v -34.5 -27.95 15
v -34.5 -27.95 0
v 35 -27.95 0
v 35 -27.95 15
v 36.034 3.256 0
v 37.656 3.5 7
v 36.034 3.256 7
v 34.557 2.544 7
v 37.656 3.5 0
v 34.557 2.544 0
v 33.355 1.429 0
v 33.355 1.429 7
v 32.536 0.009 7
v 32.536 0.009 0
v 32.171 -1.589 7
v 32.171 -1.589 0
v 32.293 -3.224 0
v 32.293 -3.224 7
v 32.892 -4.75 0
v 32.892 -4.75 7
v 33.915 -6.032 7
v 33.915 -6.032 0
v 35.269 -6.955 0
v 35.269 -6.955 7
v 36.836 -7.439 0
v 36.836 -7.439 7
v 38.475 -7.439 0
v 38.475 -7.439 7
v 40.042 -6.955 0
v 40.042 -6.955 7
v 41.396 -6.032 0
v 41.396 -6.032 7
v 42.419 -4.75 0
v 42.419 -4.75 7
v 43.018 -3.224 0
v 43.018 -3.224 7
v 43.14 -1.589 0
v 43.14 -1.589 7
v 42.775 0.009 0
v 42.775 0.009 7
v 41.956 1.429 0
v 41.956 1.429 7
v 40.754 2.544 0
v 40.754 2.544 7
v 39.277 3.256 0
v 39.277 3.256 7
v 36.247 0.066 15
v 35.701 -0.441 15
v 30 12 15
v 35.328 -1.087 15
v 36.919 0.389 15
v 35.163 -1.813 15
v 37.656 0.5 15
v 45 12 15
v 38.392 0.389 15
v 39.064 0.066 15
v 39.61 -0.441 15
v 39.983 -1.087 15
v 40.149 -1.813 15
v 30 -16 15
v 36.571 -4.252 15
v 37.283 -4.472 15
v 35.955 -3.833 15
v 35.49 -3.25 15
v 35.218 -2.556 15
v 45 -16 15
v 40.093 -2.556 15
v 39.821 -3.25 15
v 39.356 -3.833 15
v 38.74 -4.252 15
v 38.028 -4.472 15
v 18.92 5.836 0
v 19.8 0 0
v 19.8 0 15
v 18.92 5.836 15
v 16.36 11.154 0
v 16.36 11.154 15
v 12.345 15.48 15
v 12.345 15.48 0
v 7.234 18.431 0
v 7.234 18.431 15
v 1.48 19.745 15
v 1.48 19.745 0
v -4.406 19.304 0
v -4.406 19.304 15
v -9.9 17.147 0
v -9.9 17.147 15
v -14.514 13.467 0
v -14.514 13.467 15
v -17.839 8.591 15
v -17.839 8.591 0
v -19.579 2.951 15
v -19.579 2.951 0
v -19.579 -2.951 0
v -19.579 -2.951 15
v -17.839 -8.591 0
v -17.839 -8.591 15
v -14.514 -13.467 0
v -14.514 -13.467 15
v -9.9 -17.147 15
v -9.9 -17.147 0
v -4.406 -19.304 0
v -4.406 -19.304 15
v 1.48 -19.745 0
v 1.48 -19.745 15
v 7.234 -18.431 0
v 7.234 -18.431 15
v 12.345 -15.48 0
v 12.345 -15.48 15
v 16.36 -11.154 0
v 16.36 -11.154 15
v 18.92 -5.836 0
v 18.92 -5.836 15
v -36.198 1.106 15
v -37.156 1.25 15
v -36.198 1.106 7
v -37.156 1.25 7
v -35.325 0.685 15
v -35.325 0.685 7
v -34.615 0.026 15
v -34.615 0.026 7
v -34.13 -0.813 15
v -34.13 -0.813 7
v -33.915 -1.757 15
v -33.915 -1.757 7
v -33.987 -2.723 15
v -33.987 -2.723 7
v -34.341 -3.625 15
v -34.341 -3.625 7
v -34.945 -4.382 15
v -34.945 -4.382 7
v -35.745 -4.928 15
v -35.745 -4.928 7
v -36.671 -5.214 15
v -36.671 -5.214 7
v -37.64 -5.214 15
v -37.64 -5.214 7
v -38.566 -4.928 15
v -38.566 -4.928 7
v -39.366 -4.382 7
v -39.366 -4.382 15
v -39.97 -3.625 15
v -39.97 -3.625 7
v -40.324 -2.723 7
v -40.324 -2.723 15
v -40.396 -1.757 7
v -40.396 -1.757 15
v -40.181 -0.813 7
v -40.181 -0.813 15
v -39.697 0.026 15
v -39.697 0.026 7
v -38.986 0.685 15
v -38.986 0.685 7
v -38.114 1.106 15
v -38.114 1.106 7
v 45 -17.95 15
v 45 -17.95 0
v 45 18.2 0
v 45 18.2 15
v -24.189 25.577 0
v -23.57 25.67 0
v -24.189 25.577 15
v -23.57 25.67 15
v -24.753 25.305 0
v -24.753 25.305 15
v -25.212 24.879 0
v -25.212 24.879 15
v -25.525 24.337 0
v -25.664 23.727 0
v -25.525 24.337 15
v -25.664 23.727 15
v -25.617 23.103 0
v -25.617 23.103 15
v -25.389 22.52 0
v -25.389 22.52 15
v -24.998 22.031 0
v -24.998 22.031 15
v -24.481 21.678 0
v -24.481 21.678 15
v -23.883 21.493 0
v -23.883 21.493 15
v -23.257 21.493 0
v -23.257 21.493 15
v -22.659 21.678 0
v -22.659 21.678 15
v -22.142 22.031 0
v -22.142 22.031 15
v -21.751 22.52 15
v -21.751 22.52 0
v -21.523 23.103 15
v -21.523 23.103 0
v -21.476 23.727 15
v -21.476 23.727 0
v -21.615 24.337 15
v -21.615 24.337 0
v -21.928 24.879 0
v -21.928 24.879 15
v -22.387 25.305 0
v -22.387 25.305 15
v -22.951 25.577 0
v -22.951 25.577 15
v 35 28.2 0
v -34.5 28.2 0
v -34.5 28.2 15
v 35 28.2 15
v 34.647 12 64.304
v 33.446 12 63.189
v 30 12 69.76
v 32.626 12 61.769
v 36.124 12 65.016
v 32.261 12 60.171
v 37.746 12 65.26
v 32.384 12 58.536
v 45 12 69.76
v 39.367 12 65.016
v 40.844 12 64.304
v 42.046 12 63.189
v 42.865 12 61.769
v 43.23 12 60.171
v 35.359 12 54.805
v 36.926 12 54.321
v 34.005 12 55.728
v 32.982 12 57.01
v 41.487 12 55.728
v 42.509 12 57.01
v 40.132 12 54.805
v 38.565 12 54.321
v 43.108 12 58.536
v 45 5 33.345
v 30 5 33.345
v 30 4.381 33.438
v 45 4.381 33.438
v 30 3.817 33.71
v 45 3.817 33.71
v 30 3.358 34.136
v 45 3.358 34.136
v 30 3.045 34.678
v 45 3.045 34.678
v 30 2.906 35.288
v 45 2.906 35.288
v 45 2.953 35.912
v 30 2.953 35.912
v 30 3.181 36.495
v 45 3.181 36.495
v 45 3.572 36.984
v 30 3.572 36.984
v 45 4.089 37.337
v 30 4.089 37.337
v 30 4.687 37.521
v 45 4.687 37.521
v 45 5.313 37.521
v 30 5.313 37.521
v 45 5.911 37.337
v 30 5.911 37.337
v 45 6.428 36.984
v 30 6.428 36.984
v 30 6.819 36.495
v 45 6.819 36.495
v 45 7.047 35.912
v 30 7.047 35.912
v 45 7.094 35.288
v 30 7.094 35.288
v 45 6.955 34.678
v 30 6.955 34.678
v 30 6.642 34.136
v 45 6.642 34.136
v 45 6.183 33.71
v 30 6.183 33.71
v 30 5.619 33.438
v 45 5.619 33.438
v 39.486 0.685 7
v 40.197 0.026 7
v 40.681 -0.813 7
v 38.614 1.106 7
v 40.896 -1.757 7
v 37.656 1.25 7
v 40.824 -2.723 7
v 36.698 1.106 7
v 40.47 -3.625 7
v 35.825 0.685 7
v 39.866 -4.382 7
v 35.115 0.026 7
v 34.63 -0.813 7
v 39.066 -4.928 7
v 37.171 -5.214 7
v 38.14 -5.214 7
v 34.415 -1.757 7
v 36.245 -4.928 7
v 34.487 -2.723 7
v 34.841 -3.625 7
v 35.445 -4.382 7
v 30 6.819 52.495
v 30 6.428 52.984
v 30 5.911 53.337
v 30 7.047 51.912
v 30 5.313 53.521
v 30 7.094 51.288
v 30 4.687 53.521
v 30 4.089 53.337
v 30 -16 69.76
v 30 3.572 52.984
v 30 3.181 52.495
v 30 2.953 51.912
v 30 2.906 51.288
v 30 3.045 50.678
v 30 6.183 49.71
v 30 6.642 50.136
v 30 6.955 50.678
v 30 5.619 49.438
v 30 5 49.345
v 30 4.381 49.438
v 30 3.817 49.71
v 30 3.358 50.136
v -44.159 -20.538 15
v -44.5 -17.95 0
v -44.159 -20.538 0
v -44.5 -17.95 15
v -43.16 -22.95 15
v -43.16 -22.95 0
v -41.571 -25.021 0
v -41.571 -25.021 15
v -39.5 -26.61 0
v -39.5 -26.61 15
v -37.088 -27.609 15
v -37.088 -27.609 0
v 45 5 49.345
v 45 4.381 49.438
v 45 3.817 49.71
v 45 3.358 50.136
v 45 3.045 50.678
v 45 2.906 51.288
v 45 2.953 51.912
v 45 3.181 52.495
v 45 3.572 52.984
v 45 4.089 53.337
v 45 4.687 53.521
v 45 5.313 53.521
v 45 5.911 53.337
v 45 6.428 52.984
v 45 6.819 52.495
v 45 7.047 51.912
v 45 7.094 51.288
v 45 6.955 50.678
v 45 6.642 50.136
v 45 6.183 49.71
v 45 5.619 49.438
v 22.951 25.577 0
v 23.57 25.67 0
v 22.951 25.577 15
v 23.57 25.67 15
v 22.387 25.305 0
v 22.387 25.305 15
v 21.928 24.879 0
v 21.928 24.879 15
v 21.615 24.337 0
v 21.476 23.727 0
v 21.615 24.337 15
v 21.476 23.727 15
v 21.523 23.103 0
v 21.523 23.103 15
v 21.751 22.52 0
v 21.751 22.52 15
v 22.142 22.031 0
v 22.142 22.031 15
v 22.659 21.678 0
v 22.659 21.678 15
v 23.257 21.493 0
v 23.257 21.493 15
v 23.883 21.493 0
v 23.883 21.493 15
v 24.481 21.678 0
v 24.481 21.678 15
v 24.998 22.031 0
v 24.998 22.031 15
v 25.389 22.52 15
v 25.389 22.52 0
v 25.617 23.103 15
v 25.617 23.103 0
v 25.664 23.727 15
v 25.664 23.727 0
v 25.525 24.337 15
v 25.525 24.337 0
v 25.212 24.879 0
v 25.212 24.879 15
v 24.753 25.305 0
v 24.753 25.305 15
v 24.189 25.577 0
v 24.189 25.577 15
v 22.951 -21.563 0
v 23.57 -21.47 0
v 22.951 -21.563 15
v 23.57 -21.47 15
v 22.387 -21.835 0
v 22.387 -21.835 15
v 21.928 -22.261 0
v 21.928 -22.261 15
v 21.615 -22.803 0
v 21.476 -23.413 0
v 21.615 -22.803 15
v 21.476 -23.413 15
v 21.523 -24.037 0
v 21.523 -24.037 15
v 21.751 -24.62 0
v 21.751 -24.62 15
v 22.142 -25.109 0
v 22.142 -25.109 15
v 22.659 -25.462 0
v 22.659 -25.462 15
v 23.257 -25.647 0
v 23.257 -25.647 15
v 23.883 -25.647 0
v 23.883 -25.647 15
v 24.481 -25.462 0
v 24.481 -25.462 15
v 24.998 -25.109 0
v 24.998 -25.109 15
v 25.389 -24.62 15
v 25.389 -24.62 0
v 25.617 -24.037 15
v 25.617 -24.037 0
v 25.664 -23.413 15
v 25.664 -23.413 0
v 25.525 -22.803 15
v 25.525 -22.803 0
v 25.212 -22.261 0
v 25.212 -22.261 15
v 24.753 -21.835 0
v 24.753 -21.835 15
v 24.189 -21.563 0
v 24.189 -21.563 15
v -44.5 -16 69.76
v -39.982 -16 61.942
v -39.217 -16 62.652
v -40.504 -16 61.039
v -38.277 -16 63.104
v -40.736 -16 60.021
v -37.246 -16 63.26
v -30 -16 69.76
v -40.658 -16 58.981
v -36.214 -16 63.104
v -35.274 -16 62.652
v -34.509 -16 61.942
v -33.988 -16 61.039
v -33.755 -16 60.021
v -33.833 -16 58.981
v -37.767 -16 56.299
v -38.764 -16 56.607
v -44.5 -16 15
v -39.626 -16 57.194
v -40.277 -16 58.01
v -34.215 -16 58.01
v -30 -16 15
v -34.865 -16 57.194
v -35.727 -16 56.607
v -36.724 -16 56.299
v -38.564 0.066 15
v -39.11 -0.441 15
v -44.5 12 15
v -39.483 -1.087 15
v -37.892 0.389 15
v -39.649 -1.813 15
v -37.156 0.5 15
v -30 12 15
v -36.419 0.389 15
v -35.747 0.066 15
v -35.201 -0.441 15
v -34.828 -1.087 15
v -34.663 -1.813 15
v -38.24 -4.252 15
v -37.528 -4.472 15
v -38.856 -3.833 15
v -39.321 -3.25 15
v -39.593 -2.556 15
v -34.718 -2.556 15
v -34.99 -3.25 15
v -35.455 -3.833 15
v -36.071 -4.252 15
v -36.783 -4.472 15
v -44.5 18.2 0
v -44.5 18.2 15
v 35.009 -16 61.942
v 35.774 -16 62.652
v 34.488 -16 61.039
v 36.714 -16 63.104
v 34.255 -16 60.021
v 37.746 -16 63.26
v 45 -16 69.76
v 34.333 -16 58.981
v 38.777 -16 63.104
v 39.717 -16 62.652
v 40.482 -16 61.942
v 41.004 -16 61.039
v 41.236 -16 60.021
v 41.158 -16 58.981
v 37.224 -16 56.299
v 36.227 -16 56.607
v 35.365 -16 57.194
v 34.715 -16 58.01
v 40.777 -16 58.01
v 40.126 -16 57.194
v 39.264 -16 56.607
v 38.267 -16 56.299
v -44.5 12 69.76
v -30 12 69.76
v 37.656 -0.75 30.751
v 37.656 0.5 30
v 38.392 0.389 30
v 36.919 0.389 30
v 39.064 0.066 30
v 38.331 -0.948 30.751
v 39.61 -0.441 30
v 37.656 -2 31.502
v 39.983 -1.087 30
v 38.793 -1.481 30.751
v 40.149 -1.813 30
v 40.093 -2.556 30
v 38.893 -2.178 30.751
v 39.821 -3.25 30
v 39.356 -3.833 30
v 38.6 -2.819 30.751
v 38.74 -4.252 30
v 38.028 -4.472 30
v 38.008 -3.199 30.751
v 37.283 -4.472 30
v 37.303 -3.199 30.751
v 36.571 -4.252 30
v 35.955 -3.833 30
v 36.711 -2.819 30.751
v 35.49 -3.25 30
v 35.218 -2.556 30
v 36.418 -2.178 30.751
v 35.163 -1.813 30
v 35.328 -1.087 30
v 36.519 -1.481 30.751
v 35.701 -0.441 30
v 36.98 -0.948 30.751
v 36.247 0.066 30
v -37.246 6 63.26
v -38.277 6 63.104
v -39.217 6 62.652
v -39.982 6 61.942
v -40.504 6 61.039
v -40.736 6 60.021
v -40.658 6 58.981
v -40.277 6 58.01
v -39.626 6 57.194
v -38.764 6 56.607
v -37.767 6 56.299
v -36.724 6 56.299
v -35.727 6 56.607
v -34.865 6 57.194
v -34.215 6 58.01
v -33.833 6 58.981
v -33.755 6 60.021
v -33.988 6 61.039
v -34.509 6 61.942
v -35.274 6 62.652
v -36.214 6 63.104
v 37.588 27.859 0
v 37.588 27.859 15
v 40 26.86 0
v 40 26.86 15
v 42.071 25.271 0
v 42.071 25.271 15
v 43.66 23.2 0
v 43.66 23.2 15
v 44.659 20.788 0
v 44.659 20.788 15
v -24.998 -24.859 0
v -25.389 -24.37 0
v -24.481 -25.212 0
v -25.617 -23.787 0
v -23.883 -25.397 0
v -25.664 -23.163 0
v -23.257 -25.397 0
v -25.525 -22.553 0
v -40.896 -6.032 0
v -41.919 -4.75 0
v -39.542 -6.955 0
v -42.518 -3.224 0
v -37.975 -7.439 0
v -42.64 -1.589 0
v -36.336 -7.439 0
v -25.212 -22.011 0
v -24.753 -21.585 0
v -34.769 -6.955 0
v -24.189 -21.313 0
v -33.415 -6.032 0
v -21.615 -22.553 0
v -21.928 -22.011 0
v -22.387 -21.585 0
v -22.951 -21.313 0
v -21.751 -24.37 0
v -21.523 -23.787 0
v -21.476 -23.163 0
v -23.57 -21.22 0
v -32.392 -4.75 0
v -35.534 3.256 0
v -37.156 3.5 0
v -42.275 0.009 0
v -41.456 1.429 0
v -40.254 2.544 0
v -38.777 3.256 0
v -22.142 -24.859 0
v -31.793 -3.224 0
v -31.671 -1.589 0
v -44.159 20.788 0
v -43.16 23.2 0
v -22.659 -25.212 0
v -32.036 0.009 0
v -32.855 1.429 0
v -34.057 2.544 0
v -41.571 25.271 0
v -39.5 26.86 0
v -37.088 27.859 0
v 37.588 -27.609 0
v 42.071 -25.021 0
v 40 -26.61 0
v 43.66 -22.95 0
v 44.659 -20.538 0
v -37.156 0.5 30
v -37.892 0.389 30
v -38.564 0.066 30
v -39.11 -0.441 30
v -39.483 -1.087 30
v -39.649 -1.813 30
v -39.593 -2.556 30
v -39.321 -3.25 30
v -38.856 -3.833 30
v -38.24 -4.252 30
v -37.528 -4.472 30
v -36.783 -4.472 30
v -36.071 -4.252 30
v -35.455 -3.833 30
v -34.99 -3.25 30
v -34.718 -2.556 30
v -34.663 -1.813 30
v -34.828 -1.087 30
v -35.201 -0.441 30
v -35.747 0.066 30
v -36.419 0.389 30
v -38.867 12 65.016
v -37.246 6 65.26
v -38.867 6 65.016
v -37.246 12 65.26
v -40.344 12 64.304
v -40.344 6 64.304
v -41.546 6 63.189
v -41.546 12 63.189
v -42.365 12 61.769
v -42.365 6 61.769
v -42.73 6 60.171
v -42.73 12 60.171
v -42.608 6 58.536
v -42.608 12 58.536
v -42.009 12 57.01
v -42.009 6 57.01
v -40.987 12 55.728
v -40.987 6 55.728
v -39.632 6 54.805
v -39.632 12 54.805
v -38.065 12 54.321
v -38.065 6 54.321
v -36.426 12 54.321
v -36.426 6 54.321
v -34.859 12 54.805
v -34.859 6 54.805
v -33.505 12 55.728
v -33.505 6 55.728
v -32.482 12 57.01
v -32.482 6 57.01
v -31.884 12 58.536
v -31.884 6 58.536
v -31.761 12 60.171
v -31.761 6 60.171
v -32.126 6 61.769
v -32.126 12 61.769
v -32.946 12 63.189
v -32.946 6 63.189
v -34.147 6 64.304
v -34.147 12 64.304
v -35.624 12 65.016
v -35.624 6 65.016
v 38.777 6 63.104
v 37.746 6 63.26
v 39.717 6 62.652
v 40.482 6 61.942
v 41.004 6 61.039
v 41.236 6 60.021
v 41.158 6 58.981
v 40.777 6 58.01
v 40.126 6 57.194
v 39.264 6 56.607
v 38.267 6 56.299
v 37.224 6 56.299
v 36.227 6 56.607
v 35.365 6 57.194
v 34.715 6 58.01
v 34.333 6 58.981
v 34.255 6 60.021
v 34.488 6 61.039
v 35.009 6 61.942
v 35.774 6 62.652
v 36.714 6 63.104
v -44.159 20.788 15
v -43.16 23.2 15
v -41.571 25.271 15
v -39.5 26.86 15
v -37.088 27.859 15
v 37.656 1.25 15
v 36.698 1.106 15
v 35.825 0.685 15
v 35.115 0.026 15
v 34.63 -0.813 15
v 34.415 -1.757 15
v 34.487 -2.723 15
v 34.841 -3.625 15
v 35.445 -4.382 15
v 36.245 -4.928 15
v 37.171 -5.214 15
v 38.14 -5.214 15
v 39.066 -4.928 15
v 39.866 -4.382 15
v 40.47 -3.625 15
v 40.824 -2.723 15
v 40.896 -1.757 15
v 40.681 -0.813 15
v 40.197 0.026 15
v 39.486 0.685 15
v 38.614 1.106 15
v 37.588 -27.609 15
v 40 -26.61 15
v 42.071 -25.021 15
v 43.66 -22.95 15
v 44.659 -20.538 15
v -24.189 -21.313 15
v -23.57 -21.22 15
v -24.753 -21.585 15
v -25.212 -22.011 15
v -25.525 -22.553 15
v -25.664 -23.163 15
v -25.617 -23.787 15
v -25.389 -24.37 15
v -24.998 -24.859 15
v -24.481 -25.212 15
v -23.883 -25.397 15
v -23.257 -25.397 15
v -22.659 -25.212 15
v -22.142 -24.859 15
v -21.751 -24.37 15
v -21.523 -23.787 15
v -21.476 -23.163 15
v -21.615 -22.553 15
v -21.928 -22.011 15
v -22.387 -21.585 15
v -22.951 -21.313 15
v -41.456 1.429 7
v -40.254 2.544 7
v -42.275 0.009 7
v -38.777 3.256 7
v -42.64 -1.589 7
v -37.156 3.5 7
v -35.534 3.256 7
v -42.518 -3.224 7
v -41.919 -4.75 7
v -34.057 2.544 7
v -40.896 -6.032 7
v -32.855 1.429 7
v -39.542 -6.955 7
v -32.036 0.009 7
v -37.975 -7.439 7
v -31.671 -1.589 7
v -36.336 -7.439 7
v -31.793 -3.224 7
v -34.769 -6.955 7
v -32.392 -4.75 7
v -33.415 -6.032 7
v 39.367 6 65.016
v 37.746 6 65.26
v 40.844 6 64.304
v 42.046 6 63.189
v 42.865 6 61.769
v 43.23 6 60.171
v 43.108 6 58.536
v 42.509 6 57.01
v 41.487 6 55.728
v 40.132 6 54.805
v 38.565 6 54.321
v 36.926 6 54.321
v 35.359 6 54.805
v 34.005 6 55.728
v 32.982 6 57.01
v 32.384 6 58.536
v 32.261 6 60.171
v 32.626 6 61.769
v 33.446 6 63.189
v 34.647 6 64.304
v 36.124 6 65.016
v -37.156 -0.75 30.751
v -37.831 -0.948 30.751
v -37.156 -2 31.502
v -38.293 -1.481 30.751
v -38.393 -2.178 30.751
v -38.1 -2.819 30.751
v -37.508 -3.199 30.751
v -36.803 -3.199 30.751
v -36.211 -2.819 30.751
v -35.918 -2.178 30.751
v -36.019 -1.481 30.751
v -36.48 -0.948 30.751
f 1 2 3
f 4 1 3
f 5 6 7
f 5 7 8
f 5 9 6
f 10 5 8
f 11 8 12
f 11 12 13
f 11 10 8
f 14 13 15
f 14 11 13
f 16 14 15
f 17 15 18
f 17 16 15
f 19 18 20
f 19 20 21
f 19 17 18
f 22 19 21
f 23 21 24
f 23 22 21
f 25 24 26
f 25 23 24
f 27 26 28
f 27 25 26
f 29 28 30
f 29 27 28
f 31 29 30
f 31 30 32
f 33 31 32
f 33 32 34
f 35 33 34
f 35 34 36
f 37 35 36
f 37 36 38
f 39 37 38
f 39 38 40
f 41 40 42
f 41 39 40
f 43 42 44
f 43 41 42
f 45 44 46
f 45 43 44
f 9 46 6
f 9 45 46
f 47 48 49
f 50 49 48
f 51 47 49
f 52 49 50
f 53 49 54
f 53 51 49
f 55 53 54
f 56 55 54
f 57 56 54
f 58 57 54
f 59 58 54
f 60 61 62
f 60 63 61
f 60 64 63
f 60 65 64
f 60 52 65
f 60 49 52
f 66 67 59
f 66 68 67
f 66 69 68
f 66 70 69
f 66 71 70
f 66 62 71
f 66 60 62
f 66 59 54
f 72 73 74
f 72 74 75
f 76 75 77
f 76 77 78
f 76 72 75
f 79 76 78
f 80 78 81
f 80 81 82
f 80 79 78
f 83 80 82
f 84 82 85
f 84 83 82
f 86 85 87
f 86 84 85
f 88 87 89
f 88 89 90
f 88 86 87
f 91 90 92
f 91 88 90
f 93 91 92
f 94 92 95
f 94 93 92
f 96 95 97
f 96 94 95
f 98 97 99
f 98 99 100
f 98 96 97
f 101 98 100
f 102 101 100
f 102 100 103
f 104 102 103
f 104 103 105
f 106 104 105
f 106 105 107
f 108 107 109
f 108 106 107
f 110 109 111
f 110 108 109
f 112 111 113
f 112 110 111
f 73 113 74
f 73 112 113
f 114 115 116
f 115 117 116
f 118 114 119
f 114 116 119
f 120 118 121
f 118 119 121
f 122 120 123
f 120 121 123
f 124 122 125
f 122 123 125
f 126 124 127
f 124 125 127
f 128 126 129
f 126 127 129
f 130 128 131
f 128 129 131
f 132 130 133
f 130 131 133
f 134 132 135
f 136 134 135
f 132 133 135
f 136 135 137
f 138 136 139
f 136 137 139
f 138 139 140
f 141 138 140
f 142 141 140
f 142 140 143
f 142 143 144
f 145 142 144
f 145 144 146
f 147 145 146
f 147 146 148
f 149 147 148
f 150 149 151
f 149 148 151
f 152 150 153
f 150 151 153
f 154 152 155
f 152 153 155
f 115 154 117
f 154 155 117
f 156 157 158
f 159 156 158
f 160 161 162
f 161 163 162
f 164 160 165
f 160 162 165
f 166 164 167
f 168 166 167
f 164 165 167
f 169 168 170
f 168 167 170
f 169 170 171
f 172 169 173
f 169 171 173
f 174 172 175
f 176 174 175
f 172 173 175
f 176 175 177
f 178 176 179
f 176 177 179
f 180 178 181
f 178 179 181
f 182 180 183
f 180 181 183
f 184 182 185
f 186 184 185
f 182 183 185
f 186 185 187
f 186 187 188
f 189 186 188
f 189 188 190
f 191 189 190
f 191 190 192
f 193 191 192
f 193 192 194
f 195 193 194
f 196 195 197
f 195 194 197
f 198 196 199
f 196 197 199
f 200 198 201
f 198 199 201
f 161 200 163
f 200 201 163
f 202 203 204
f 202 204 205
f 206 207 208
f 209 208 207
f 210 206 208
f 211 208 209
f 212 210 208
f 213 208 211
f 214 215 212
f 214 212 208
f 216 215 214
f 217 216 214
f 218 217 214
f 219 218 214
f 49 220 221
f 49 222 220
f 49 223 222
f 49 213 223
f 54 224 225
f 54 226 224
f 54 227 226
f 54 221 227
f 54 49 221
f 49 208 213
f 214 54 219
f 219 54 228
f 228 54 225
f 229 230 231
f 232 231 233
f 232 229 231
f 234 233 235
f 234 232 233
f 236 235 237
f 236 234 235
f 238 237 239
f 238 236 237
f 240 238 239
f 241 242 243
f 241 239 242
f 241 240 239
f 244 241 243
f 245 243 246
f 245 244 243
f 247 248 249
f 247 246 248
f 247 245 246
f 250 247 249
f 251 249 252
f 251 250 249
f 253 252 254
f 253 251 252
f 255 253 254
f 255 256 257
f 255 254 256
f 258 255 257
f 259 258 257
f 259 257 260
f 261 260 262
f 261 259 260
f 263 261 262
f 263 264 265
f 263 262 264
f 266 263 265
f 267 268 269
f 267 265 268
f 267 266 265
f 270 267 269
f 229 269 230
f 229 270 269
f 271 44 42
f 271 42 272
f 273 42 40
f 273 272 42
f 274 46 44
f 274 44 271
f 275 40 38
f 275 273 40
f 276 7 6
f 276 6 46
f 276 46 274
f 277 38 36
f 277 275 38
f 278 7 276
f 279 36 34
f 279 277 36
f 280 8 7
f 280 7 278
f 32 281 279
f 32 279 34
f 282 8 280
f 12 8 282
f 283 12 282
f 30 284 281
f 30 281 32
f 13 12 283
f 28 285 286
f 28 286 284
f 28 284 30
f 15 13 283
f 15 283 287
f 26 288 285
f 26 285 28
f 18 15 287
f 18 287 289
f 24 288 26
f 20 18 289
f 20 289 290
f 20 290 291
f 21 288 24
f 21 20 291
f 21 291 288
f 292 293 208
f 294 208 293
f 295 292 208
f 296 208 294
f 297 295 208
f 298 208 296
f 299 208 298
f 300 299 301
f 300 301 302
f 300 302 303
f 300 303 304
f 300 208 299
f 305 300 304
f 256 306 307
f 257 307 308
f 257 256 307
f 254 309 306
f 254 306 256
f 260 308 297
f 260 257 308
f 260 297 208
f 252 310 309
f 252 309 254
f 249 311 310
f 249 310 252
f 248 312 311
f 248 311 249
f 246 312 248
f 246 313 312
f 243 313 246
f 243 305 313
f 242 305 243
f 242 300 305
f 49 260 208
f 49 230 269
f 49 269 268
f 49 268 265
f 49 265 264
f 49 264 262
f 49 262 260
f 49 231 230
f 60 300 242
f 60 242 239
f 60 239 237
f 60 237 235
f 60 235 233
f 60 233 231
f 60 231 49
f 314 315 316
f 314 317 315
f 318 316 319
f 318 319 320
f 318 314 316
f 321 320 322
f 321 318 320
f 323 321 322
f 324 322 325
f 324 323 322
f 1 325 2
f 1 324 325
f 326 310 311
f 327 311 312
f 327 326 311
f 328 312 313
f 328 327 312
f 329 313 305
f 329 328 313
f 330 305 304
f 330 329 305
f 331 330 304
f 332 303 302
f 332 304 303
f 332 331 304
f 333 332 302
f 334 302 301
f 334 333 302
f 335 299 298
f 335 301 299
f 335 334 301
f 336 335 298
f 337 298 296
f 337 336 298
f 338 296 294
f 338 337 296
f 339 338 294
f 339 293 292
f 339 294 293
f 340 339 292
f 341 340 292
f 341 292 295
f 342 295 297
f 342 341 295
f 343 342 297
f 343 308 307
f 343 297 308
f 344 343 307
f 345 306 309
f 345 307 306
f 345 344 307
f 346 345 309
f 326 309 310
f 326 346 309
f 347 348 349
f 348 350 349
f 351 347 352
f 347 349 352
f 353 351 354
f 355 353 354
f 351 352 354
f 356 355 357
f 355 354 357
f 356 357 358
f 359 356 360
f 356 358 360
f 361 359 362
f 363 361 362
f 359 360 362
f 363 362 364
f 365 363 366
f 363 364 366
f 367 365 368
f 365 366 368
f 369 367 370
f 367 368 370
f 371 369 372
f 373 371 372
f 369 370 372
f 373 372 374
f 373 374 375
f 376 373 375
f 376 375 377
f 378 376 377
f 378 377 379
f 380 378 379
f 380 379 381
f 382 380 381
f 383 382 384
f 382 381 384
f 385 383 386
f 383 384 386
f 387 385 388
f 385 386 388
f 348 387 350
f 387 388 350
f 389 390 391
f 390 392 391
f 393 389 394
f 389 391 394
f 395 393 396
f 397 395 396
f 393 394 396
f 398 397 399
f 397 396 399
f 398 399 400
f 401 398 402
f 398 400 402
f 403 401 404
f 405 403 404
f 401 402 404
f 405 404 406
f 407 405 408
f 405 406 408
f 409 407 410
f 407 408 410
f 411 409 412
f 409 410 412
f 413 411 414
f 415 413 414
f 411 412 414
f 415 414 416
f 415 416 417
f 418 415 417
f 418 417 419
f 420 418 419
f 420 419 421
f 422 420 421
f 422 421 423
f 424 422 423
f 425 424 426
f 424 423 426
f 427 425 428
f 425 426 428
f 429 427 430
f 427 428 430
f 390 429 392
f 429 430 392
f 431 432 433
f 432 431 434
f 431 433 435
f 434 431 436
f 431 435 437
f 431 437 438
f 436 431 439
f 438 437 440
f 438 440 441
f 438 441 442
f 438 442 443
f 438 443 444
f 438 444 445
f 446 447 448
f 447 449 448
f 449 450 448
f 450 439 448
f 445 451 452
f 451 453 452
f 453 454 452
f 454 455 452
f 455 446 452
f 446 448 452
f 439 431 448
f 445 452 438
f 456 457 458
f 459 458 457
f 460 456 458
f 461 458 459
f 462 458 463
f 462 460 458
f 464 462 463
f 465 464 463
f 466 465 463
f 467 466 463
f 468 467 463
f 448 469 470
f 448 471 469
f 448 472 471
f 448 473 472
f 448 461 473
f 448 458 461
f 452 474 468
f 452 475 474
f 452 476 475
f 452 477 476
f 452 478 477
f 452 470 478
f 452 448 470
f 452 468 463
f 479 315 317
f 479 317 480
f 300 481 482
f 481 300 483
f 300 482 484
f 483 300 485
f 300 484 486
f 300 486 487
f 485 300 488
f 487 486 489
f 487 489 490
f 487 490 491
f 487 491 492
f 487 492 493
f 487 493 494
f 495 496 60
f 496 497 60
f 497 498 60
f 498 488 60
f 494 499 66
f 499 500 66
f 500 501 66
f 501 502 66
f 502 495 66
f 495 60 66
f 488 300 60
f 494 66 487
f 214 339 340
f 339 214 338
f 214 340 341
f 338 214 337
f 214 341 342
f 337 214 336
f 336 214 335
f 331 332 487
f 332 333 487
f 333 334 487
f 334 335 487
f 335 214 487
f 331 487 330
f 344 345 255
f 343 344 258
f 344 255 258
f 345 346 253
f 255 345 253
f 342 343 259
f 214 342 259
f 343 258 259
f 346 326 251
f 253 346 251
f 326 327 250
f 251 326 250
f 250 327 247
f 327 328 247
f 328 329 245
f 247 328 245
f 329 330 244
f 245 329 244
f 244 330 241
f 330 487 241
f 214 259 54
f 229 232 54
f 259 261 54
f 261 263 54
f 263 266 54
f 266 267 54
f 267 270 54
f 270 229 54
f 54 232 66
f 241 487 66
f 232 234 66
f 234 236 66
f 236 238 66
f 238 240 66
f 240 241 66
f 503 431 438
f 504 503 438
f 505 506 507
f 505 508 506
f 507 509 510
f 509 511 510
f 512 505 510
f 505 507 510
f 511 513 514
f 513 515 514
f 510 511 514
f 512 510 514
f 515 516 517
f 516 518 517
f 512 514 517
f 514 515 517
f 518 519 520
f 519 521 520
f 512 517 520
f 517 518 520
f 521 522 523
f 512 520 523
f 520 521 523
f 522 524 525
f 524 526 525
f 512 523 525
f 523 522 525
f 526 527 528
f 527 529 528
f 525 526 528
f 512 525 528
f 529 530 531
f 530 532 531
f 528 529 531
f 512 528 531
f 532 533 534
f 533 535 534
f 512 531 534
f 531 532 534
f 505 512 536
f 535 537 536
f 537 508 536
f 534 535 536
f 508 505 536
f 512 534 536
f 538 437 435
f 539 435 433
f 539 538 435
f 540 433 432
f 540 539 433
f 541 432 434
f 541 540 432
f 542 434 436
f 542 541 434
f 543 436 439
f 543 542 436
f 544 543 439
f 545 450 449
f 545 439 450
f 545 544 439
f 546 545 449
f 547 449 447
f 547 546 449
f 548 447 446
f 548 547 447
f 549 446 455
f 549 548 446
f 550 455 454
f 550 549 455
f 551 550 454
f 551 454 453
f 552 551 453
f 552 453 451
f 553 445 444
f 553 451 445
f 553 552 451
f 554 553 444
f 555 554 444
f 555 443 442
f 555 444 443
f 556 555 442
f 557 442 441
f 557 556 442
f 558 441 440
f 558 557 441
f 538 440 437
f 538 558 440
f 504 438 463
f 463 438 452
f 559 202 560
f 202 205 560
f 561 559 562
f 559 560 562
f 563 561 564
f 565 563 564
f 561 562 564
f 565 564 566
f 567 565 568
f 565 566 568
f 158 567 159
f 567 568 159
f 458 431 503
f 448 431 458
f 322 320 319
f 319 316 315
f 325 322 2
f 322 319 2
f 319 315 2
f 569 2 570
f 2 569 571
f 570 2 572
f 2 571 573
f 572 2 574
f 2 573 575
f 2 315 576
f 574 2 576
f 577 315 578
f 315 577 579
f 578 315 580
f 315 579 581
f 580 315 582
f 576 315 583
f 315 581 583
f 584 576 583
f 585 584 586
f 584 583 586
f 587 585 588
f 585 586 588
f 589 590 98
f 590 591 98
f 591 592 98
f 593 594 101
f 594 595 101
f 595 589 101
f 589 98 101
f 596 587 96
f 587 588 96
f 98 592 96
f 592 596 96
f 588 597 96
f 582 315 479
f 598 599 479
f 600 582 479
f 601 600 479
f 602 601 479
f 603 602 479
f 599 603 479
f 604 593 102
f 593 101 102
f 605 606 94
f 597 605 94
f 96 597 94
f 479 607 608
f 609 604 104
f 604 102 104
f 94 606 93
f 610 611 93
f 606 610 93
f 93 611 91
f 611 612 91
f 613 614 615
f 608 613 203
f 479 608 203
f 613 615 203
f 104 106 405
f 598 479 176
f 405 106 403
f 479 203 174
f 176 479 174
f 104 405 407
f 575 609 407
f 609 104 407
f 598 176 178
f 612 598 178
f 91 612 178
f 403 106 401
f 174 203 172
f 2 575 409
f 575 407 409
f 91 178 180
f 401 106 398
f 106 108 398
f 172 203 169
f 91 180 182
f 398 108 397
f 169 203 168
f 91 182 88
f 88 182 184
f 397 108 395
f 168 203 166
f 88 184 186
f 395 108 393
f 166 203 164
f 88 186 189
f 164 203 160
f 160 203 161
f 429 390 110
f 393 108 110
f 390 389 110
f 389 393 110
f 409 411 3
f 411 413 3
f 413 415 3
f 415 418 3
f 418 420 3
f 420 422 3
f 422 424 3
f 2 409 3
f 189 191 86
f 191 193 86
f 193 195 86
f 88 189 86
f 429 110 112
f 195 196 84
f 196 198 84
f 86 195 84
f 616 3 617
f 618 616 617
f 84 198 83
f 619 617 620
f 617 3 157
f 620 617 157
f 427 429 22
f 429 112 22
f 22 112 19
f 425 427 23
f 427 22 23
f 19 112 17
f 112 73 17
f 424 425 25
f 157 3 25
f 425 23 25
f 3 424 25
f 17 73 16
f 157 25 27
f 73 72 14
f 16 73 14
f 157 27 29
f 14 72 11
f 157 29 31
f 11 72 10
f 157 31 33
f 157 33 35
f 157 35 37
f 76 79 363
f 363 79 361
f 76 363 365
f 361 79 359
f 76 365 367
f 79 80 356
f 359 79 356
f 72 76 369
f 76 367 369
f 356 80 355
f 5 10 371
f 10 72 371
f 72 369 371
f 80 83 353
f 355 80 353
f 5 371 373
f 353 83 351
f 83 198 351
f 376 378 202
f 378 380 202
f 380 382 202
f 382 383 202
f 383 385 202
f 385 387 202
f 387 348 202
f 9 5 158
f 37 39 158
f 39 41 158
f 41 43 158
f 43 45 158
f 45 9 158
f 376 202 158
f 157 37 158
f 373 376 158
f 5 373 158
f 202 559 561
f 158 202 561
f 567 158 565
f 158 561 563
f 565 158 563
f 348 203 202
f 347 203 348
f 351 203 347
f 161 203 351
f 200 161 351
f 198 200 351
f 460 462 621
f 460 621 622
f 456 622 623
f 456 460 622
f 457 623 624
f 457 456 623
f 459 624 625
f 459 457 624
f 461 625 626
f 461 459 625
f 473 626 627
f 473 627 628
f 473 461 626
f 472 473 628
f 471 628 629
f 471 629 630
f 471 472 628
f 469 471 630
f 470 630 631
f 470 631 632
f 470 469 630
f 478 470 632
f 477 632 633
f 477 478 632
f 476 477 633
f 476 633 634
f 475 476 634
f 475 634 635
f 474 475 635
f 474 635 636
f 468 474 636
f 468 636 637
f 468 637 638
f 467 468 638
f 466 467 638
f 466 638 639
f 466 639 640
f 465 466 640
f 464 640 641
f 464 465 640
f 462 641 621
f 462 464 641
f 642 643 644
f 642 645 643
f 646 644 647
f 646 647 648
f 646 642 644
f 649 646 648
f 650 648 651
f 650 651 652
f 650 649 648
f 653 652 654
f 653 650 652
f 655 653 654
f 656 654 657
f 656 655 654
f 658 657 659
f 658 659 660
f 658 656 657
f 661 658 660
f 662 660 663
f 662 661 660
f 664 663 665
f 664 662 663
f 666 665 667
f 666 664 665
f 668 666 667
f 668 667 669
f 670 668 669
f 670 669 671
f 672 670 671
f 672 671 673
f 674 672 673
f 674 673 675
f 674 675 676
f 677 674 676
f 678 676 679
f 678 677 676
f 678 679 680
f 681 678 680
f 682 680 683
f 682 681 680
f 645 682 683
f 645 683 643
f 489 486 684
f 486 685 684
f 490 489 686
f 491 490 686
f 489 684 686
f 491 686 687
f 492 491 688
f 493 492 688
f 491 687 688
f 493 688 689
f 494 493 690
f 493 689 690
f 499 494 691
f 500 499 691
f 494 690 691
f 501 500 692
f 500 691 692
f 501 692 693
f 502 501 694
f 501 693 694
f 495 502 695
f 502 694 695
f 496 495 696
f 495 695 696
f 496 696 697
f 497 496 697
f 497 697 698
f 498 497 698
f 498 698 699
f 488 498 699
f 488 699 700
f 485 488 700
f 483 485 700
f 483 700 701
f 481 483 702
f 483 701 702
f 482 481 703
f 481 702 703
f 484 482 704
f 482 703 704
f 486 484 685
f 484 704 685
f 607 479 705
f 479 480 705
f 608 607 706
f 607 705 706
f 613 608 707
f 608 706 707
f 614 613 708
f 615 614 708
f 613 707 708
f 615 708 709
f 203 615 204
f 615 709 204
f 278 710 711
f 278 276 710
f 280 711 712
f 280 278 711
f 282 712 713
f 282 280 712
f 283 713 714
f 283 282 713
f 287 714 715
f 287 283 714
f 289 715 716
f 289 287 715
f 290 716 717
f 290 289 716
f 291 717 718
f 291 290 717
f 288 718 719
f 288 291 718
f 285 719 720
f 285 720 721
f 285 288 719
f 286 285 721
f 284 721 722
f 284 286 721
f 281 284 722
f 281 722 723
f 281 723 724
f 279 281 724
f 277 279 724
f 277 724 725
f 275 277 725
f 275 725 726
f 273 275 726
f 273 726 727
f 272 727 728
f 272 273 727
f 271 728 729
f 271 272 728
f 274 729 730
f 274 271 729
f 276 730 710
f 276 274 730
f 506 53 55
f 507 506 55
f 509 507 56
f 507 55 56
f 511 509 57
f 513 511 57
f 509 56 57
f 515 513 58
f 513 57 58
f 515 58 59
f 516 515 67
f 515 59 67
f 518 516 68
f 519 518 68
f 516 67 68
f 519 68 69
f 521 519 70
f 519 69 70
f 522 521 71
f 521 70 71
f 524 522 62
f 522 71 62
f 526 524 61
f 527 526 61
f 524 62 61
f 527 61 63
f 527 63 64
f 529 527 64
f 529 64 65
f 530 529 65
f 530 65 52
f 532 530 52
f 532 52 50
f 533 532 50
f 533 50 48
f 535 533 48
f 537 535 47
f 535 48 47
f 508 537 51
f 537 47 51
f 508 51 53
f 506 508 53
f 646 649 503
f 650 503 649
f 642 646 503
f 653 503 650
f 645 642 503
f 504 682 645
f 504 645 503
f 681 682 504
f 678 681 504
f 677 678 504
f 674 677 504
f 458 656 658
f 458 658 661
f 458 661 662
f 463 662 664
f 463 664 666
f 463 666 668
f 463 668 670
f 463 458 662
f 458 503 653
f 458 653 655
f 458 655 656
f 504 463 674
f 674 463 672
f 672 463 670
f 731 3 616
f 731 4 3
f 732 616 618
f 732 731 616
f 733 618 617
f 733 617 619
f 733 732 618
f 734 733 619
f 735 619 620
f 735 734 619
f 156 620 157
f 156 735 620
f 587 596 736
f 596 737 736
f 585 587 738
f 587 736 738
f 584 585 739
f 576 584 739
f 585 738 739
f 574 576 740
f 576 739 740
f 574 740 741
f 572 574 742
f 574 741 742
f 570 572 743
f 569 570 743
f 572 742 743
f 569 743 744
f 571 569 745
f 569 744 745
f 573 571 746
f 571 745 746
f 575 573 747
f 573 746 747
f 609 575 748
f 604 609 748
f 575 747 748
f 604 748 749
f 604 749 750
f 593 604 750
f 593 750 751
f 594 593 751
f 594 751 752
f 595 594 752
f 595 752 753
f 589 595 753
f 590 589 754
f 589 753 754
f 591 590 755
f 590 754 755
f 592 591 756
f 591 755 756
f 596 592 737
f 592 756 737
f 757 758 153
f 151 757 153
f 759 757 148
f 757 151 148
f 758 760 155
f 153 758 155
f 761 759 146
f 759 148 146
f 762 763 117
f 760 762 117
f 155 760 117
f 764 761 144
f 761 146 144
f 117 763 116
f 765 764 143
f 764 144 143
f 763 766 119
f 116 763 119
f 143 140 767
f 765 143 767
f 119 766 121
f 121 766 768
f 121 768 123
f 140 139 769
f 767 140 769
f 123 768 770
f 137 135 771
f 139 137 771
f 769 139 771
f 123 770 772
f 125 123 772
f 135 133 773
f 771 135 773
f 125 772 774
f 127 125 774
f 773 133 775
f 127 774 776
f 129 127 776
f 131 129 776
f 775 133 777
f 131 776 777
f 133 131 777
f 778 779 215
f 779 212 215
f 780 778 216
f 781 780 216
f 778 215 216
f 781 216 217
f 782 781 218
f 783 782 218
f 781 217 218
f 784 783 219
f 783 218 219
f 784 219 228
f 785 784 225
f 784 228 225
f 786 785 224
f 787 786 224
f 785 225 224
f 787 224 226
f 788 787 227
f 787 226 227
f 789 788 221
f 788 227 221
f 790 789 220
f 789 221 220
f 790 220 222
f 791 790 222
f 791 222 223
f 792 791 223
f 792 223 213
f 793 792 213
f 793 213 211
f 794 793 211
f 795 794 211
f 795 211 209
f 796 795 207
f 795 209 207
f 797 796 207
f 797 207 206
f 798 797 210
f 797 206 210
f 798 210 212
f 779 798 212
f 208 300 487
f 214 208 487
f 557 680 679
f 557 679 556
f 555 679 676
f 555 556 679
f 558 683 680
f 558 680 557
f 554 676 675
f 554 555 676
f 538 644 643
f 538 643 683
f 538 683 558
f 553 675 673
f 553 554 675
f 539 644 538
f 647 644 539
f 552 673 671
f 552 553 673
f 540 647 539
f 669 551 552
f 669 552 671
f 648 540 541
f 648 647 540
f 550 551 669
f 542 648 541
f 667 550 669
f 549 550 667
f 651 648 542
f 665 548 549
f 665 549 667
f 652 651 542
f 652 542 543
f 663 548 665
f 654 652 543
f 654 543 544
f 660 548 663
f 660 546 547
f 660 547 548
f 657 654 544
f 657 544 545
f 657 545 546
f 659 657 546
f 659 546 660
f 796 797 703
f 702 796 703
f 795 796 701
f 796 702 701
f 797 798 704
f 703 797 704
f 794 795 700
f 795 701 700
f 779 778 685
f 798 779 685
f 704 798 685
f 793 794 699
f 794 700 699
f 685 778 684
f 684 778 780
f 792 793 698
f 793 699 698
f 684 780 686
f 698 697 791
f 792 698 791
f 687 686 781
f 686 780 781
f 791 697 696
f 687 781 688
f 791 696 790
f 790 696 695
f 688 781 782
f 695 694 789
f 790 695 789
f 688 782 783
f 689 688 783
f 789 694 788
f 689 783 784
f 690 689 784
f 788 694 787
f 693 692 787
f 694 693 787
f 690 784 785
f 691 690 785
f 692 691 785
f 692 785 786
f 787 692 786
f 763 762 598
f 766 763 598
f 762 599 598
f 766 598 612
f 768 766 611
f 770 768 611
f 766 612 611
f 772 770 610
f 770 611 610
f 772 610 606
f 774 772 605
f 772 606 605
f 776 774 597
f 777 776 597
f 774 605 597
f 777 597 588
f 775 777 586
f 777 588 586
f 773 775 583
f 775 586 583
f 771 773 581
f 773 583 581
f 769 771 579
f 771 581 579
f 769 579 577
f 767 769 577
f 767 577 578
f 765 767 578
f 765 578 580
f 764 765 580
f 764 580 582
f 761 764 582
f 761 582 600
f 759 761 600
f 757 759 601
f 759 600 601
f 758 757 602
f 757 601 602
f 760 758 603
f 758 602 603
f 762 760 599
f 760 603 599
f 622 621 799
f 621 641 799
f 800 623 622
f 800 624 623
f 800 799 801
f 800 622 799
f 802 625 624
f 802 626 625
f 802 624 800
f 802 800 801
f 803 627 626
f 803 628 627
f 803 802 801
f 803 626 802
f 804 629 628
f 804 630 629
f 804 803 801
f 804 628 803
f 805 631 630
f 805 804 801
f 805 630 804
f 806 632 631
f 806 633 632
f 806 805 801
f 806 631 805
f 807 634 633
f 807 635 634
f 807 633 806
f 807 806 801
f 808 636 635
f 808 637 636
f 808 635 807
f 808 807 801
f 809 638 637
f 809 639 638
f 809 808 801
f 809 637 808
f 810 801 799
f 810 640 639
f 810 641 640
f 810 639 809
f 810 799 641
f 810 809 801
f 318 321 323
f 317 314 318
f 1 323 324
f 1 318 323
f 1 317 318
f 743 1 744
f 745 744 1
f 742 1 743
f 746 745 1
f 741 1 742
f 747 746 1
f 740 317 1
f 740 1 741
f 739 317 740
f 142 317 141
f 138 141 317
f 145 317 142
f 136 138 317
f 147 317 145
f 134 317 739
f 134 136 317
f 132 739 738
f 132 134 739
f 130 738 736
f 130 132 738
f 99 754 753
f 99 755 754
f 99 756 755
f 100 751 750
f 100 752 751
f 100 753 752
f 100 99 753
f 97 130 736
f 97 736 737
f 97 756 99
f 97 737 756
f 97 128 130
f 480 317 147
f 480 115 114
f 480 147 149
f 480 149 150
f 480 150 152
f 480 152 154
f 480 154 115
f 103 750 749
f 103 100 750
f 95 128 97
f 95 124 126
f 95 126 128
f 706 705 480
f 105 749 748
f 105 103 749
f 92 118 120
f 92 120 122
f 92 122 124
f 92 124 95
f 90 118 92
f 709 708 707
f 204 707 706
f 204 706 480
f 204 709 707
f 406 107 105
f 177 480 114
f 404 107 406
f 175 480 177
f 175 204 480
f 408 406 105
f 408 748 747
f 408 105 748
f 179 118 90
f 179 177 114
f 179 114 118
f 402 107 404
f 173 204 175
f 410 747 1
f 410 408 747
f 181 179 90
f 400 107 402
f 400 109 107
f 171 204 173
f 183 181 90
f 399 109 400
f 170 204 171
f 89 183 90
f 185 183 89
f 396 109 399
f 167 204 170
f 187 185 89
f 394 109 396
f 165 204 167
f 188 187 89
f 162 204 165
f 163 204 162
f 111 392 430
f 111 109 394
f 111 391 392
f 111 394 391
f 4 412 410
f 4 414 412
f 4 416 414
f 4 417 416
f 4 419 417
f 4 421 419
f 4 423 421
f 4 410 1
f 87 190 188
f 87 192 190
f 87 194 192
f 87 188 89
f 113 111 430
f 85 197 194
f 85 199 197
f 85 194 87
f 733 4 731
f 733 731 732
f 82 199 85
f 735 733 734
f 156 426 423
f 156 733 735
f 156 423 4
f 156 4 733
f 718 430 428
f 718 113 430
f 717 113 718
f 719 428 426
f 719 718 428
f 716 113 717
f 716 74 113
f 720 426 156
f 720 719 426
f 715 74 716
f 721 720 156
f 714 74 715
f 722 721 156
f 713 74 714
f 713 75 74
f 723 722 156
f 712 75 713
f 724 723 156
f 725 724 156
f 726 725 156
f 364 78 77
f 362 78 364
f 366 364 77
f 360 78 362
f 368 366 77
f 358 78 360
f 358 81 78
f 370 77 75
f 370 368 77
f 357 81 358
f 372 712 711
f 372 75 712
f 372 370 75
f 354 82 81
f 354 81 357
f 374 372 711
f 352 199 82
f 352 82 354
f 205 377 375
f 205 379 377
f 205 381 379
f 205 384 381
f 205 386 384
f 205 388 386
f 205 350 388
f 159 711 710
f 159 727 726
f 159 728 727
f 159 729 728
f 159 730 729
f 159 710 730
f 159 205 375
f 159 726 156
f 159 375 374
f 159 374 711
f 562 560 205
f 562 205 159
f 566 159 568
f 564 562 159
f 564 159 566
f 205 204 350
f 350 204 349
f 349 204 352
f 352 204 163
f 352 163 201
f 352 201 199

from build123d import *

# Parameters (mm, degrees)
SKETCH1_W                            = 89.5
SKETCH1_H                            = 56.15
SKETCH1_R                            = 19.8
BOSS_EXTRUDE1_DEPTH                  = 15
SKETCH2_W                            = 14.5
SKETCH2_H                            = 54.759929683
BOSS_EXTRUDE3_DEPTH                  = 28
SKETCH2_W_2                          = 15
BOSS_EXTRUDE3_2_DEPTH                = 28
SKETCH12_W                           = 2.1
SKETCH12_H                           = 15
M5X0_8_TAPPED_HOLE1_AT_2_COUNT       = 2
M5X0_8_TAPPED_HOLE1_AT_2_PITCH       = 47.140662914
M5X0_8_TAPPED_HOLE1_AT_3_COUNT       = 2
M5X0_8_TAPPED_HOLE1_AT_3_PITCH       = 66.489485635
M5X0_8_TAPPED_HOLE1_AT_4_COUNT       = 2
M5X0_8_TAPPED_HOLE1_AT_4_PITCH       = 46.89
FILLET1_R                            = 10
TAP_DRILL_FOR_M5X0_8_TAP2_AT_2_COUNT = 2
TAP_DRILL_FOR_M5X0_8_TAP2_AT_2_PITCH = 16


with BuildPart() as part:
    # Sketch1 → Boss-Extrude1 (new body)
    with BuildSketch(Plane.XY):
        with Locations((0.25, 0.125)):
            Rectangle(SKETCH1_W, SKETCH1_H)
        Circle(SKETCH1_R, mode=Mode.SUBTRACT)
    extrude(amount=BOSS_EXTRUDE1_DEPTH)

    # Sketch5 → Hole1 (revolve, cut)
    with BuildSketch(Plane(origin=(-37.155548207, -2, 0), x_dir=(0, 1, 0), z_dir=(1, 0, 0))):
        Polygon((0, 0), (0, 15), (3.25, 15), (3.25, 7), (5.5, 7), (5.5, 0), align=None)
    hole1 = revolve(axis=Axis((-37.155548207, -2, 110), (0, 0, -1)), mode=Mode.SUBTRACT)


with BuildPart() as body_2:
    # Sketch2 → Boss-Extrude3 (new body)
    with BuildSketch(Plane(origin=(0, -16, 0), x_dir=(1, 0, 0), z_dir=(0, 1, 0))):
        with Locations((-37.25, -42.379964842)):
            Rectangle(SKETCH2_W, SKETCH2_H)
    extrude(amount=BOSS_EXTRUDE3_DEPTH)

    # Sketch7 → Tap Drill for M6x1.0 Tap1 (revolve, cut)
    with BuildSketch(Plane(origin=(-37.155548207, -2, 0), x_dir=(0, 1, 0), z_dir=(1, 0, 0))):
        Polygon((0, 0), (0, 31.502151548), (2.5, 30), (2.5, 0), align=None)
    tap_drill_for_m6x1_0_tap1 = revolve(axis=Axis((-37.155548207, -2, -6.35), (0, 0, 1)), mode=Mode.SUBTRACT)

    # Sketch10 → CBORE for M6 SHCS1 (revolve, cut)
    with BuildSketch(Plane(origin=(-37.245608268, 12, 59.759929683), x_dir=(0, 0, 1), z_dir=(1, 0, 0))):
        Polygon((0, 0), (0, 28.001), (3.5, 28.001), (3.5, 6), (5.5, 6), (5.5, 0), align=None)
    cbore_for_m6_shcs1 = revolve(axis=Axis((-37.245608268, 18.35, 59.759929683), (0, -1, 0)), mode=Mode.SUBTRACT)


with BuildPart() as body_3:
    # Sketch2 → Boss-Extrude3 2 (new body)
    with BuildSketch(Plane(origin=(0, -16, 0), x_dir=(1, 0, 0), z_dir=(0, 1, 0))):
        with Locations((37.5, -42.379964842)):
            Rectangle(SKETCH2_W_2, SKETCH2_H)
    extrude(amount=BOSS_EXTRUDE3_2_DEPTH)


with BuildPart() as mirror1_tool:
    # Mirror1: Hole1, Tap Drill for M6x1.0 Tap1, CBORE for M6 SHCS1 across plane
    add(hole1.mirror(Plane(origin=(0.25, 0, 0), x_dir=(0, 0, 1), z_dir=(1, 0, 0))))
    add(tap_drill_for_m6x1_0_tap1.mirror(Plane(origin=(0.25, 0, 0), x_dir=(0, 0, 1), z_dir=(1, 0, 0))))
    add(cbore_for_m6_shcs1.mirror(Plane(origin=(0.25, 0, 0), x_dir=(0, 0, 1), z_dir=(1, 0, 0))))


with BuildPart() as part_1:
    add(part.part)

    # Mirror1: cut by mirror1_tool
    add(mirror1_tool.part, mode=Mode.SUBTRACT)

    # Sketch12 → M5x0.8 Tapped Hole1 (revolve, cut)
    with BuildSketch(Plane(origin=(-23.57, -23.32, 0), x_dir=(0, 1, 0), z_dir=(1, 0, 0))):
        with Locations((1.05, 7.5)):
            Rectangle(SKETCH12_W, SKETCH12_H)
    m5x0_8_tapped_hole1 = revolve(axis=Axis((-23.57, -23.32, -6.35), (0, 0, 1)), mode=Mode.SUBTRACT)

    # M5x0.8 Tapped Hole1 at 2: M5x0.8 Tapped Hole1 ×2
    with Locations(*[Vector(0.9999859375269115, -0.005303277140045137, 0) * (i * M5X0_8_TAPPED_HOLE1_AT_2_PITCH) for i in range(1, M5X0_8_TAPPED_HOLE1_AT_2_COUNT)]):
        add(m5x0_8_tapped_hole1, mode=Mode.SUBTRACT)

    # M5x0.8 Tapped Hole1 at 3: M5x0.8 Tapped Hole1 ×2
    with Locations(*[Vector(0.7089842784890216, 0.705224285497459, 0) * (i * M5X0_8_TAPPED_HOLE1_AT_3_PITCH) for i in range(1, M5X0_8_TAPPED_HOLE1_AT_3_COUNT)]):
        add(m5x0_8_tapped_hole1, mode=Mode.SUBTRACT)

    # M5x0.8 Tapped Hole1 at 4: M5x0.8 Tapped Hole1 ×2
    with Locations(*[(0, i * M5X0_8_TAPPED_HOLE1_AT_4_PITCH, 0) for i in range(1, M5X0_8_TAPPED_HOLE1_AT_4_COUNT)]):
        add(m5x0_8_tapped_hole1, mode=Mode.SUBTRACT)

    # Fillet1
    fillet1_edges = [part_1.edges().sort_by_distance(p)[0] for p in [
        (-44.5, 28.2, 7.5),
        (45, 28.2, 7.5),
        (45, -27.95, 7.5),
        (-44.5, -27.95, 7.5),
    ]]
    fillet(fillet1_edges, radius=FILLET1_R)


with BuildPart() as body_3_1:
    add(body_3.part)

    # Mirror1: cut by mirror1_tool
    add(mirror1_tool.part, mode=Mode.SUBTRACT)

    # Sketch15 → Tap Drill for M5x0.8 Tap2 (revolve, cut)
    with BuildSketch(Plane(origin=(45, 5, 35.44487549), x_dir=(0, 0, -1), z_dir=(0, 1, 0))):
        Polygon((0, 0), (0, 21.2618073), (2.1, 20), (2.1, 0), align=None)
    tap_drill_for_m5x0_8_tap2 = revolve(axis=Axis((51.35, 5, 35.44487549), (-1, 0, 0)), mode=Mode.SUBTRACT)

    # Tap Drill for M5x0.8 Tap2 at 2: Tap Drill for M5x0.8 Tap2 ×2
    with Locations(*[(0, 0, i * TAP_DRILL_FOR_M5X0_8_TAP2_AT_2_PITCH) for i in range(1, TAP_DRILL_FOR_M5X0_8_TAP2_AT_2_COUNT)]):
        add(tap_drill_for_m5x0_8_tap2, mode=Mode.SUBTRACT)


solid = Compound([body_2.part, part_1.part, body_3_1.part])
